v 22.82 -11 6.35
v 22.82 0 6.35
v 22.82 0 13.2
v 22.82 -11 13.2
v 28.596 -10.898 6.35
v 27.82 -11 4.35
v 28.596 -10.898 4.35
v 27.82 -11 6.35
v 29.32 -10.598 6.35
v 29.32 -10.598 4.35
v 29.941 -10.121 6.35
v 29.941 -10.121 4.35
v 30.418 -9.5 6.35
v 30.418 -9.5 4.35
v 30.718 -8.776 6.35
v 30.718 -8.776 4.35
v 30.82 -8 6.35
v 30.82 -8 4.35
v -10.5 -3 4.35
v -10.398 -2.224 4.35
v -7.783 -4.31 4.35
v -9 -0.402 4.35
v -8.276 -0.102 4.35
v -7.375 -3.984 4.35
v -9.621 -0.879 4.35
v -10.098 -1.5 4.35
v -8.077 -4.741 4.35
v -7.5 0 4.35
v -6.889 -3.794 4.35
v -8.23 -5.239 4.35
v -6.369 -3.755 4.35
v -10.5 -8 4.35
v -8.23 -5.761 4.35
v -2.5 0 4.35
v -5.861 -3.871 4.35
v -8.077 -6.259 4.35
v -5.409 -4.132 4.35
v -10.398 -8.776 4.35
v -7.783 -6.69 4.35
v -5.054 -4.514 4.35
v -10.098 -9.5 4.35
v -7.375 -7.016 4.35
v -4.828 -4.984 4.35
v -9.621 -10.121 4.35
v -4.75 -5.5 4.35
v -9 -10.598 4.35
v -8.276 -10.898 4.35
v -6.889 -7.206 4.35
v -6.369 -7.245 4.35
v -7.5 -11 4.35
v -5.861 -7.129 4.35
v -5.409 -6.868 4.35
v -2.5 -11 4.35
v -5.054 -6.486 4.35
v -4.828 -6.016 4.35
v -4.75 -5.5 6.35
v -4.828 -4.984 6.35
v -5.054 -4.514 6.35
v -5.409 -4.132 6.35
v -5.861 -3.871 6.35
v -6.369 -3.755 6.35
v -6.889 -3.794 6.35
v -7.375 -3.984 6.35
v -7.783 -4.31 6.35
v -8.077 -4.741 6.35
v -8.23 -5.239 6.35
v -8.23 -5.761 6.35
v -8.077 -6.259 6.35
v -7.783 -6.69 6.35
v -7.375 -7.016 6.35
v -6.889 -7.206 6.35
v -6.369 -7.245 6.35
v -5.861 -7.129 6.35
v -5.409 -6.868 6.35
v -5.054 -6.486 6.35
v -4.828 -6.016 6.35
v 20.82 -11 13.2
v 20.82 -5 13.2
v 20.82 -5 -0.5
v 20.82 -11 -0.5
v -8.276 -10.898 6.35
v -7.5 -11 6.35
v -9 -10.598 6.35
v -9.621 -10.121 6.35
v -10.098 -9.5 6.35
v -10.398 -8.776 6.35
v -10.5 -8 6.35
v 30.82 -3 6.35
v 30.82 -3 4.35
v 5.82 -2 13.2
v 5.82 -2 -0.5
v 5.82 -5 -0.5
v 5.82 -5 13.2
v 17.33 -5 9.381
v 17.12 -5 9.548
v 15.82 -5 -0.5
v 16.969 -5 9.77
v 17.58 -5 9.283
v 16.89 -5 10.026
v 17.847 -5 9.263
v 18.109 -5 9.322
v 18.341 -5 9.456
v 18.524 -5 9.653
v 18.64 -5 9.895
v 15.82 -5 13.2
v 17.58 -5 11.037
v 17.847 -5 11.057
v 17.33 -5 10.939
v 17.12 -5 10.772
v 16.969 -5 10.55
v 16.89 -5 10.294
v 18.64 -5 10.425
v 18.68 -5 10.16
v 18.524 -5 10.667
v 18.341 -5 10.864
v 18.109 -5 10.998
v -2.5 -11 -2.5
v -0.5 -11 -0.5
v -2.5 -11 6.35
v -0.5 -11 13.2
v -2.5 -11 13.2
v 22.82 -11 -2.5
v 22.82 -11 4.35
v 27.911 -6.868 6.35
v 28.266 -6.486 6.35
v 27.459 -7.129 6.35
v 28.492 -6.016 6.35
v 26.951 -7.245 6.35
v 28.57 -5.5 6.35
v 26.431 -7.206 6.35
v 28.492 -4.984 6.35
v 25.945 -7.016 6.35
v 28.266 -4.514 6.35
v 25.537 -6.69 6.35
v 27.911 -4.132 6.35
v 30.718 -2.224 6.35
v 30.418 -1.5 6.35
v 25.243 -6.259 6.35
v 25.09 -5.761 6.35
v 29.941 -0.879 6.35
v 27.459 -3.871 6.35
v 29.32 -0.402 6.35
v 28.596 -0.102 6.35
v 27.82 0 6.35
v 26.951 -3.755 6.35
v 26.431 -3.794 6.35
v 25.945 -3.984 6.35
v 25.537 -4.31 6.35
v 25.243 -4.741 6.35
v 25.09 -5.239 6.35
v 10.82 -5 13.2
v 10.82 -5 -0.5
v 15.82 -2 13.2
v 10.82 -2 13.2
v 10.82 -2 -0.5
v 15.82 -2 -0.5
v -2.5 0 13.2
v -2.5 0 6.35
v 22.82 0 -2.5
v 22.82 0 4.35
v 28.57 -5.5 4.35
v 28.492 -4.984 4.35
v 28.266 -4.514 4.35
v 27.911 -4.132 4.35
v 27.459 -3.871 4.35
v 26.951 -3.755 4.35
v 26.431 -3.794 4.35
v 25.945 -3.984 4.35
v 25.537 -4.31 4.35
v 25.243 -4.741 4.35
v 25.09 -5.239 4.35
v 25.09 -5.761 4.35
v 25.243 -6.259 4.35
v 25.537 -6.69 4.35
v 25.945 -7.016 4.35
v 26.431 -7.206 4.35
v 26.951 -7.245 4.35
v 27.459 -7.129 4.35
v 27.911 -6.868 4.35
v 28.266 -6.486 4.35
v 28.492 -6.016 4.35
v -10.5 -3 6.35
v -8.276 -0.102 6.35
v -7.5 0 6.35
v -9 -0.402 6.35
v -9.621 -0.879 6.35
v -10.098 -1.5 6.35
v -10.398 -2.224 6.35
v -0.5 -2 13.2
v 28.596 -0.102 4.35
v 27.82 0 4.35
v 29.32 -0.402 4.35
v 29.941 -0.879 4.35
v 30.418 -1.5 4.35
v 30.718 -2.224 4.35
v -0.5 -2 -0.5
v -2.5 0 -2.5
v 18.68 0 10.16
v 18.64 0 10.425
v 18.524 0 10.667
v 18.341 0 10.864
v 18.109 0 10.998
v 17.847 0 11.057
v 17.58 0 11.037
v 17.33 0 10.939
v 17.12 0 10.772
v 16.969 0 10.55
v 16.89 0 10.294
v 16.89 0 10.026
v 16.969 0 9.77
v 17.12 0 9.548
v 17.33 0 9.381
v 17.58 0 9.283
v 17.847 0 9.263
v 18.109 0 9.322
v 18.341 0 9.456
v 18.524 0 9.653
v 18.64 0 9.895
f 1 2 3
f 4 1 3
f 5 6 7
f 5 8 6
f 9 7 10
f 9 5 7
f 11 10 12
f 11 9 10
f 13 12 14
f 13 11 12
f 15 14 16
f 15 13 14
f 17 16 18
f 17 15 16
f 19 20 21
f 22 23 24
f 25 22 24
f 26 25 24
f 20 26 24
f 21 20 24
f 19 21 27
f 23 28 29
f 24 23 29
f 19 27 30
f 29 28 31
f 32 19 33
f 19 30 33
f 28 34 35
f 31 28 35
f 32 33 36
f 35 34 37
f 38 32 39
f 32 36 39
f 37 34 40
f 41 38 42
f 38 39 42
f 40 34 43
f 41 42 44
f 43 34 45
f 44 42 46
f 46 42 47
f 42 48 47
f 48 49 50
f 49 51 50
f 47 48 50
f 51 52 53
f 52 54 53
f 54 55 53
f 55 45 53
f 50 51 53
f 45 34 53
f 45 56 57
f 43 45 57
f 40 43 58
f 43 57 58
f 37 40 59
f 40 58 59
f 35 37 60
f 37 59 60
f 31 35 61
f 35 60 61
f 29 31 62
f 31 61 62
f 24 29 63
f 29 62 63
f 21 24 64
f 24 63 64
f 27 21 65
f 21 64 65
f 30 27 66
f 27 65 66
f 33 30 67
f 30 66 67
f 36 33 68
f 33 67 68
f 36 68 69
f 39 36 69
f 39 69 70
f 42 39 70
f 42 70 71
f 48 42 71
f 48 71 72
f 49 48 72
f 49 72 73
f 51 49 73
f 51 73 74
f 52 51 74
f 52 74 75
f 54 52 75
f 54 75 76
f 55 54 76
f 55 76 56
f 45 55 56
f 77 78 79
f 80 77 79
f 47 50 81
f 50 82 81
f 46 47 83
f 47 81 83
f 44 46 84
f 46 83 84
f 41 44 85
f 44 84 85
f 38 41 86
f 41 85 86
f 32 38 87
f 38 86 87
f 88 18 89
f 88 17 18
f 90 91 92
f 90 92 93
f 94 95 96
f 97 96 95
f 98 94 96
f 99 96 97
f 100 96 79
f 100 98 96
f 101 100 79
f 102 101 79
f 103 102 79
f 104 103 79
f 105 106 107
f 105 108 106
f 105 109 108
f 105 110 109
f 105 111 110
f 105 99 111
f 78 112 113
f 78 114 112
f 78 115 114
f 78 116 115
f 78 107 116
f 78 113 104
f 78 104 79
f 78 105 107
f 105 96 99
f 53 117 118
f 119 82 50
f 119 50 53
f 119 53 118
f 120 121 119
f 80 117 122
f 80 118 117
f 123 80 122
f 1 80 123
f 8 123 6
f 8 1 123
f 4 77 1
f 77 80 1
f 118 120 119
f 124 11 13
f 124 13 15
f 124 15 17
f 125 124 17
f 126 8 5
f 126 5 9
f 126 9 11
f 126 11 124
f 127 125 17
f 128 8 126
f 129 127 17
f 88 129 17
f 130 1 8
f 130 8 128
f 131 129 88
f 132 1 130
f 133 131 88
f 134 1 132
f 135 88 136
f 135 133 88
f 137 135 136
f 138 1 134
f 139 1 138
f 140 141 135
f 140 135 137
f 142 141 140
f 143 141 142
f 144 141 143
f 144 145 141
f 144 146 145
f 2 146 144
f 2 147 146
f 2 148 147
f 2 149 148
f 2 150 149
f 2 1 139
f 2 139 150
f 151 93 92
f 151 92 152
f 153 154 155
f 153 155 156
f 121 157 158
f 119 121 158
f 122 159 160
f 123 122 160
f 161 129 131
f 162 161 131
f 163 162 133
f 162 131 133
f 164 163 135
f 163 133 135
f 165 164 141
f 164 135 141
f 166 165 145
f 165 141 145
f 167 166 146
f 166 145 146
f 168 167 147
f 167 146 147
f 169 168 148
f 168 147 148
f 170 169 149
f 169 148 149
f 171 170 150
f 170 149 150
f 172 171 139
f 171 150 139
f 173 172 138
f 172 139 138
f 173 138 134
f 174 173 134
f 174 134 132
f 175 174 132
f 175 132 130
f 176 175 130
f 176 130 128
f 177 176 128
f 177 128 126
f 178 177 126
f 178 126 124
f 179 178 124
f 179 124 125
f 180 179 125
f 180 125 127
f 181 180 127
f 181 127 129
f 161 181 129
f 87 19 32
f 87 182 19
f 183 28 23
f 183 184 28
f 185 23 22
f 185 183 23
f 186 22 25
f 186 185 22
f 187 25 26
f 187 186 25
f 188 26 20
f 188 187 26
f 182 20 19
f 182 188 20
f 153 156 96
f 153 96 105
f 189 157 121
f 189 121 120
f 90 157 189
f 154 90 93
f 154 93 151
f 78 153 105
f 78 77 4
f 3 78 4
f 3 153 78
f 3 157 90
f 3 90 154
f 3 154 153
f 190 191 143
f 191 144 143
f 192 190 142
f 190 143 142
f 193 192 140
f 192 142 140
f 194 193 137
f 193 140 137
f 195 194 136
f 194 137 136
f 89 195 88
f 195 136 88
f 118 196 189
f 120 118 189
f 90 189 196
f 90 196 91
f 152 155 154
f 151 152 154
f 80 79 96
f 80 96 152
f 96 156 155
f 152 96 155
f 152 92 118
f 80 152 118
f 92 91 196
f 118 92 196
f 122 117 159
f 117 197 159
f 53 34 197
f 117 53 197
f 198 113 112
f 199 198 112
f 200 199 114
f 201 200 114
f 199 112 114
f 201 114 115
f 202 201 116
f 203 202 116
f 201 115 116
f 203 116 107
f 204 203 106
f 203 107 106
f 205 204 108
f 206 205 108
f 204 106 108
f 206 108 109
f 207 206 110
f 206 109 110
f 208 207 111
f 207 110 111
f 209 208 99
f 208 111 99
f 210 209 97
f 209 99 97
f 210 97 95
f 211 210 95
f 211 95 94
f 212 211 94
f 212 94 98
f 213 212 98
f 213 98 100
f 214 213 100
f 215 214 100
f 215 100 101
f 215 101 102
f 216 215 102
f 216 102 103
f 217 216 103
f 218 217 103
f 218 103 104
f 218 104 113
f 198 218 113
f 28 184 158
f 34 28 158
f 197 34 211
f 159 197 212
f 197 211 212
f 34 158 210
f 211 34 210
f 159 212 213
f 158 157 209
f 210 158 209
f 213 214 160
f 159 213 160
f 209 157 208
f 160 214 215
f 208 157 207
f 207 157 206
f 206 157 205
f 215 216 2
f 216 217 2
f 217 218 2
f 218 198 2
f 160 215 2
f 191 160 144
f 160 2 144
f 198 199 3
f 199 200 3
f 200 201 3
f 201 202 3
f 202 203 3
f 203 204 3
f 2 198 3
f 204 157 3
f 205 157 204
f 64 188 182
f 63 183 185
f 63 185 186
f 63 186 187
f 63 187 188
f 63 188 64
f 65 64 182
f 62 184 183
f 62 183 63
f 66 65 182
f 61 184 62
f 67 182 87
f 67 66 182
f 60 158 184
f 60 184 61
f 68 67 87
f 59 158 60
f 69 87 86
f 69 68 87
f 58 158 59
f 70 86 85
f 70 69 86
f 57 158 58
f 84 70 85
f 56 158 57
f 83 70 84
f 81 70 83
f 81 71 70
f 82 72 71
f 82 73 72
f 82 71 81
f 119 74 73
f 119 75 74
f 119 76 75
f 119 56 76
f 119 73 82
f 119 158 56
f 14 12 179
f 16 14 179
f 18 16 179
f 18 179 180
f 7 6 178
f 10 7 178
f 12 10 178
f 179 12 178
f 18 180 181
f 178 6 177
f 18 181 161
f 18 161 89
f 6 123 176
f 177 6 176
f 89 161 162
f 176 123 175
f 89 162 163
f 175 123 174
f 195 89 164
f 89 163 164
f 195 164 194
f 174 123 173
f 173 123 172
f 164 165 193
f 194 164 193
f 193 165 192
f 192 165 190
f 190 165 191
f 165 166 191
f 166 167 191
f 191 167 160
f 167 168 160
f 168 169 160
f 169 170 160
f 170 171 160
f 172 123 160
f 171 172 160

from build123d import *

# Parameters (mm, degrees)
F0_W      = 25.32
F0_H      = 15.7
F1_DEPTH  = 2
F3_DEPTH  = 9
F4_W      = 5
F4_H      = 13.7
F5_DEPTH  = 3
F6_R      = 0.9
F7_DEPTH  = 5.001
F8_W      = 11
F8_H      = 2
F9_DEPTH  = 8
F10_R     = 3
F11_W     = 11
F11_H     = 2
F12_DEPTH = 8
F13_R     = 3
F14_R     = 1.75
F15_DEPTH = 8.851
F16_R     = 1.75
F17_DEPTH = 8.851


with BuildPart() as f1:
    # F0 (on Front) → F1 (new body)
    with BuildSketch(Plane.XZ):
        with Locations((10.16, 5.35)):
            Rectangle(F0_W, F0_H)
    extrude(amount=F1_DEPTH)

    # F2 (on face) → F3 (join)
    with BuildSketch(Plane.XZ.offset(2)):
        Polygon((-2.5, 13.2), (-2.5, -2.5), (22.82, -2.5), (22.82, 13.2), (20.82, 13.2), (20.82, -0.5), (-0.5, -0.5), (-0.5, 13.2), align=None)
    extrude(amount=F3_DEPTH)

    # F4 (on face) → F5 (join)
    with BuildSketch(Plane.XZ.offset(2)):
        with Locations((8.32, 6.35)):
            Rectangle(F4_W, F4_H)
        with Locations((18.32, 6.35)):
            Rectangle(F4_W, F4_H)
    extrude(amount=F5_DEPTH)

    # F6 (on face) → F7 (cut, through all)
    with BuildSketch(Plane.XZ.offset(5)):
        with Locations((17.78, 10.16)):
            Circle(F6_R)
    extrude(amount=-F7_DEPTH, mode=Mode.SUBTRACT)

    # F8 (on face) → F9 (join)
    with BuildSketch(Plane(origin=(-2.5, 0, 0), x_dir=(0, -1, 0), z_dir=(-1, 0, 0))):
        with Locations((5.5, 5.35)):
            Rectangle(F8_W, F8_H)
    extrude(amount=F9_DEPTH)

    # F10
    f10_edges = [f1.edges().sort_by_distance(p)[0] for p in [
        (-10.5, -11, 5.35),
        (-10.5, 0, 5.35),
    ]]
    fillet(f10_edges, radius=F10_R)

    # F11 (on face) → F12 (join)
    with BuildSketch(Plane.YZ.offset(22.82)):
        with Locations((-5.5, 5.35)):
            Rectangle(F11_W, F11_H)
    extrude(amount=F12_DEPTH)

    # F13
    f13_edges = [f1.edges().sort_by_distance(p)[0] for p in [
        (30.82, -11, 5.35),
        (30.82, 0, 5.35),
    ]]
    fillet(f13_edges, radius=F13_R)

    # F14 (on face) → F15 (cut, through all)
    with BuildSketch(Plane.XY.offset(6.35)):
        with Locations((-6.5, -5.5)):
            Circle(F14_R)
    extrude(amount=-F15_DEPTH, mode=Mode.SUBTRACT)

    # F16 (on face) → F17 (cut, through all)
    with BuildSketch(Plane.XY.offset(6.35)):
        with Locations((26.82, -5.5)):
            Circle(F16_R)
    extrude(amount=-F17_DEPTH, mode=Mode.SUBTRACT)


solid = f1.part
